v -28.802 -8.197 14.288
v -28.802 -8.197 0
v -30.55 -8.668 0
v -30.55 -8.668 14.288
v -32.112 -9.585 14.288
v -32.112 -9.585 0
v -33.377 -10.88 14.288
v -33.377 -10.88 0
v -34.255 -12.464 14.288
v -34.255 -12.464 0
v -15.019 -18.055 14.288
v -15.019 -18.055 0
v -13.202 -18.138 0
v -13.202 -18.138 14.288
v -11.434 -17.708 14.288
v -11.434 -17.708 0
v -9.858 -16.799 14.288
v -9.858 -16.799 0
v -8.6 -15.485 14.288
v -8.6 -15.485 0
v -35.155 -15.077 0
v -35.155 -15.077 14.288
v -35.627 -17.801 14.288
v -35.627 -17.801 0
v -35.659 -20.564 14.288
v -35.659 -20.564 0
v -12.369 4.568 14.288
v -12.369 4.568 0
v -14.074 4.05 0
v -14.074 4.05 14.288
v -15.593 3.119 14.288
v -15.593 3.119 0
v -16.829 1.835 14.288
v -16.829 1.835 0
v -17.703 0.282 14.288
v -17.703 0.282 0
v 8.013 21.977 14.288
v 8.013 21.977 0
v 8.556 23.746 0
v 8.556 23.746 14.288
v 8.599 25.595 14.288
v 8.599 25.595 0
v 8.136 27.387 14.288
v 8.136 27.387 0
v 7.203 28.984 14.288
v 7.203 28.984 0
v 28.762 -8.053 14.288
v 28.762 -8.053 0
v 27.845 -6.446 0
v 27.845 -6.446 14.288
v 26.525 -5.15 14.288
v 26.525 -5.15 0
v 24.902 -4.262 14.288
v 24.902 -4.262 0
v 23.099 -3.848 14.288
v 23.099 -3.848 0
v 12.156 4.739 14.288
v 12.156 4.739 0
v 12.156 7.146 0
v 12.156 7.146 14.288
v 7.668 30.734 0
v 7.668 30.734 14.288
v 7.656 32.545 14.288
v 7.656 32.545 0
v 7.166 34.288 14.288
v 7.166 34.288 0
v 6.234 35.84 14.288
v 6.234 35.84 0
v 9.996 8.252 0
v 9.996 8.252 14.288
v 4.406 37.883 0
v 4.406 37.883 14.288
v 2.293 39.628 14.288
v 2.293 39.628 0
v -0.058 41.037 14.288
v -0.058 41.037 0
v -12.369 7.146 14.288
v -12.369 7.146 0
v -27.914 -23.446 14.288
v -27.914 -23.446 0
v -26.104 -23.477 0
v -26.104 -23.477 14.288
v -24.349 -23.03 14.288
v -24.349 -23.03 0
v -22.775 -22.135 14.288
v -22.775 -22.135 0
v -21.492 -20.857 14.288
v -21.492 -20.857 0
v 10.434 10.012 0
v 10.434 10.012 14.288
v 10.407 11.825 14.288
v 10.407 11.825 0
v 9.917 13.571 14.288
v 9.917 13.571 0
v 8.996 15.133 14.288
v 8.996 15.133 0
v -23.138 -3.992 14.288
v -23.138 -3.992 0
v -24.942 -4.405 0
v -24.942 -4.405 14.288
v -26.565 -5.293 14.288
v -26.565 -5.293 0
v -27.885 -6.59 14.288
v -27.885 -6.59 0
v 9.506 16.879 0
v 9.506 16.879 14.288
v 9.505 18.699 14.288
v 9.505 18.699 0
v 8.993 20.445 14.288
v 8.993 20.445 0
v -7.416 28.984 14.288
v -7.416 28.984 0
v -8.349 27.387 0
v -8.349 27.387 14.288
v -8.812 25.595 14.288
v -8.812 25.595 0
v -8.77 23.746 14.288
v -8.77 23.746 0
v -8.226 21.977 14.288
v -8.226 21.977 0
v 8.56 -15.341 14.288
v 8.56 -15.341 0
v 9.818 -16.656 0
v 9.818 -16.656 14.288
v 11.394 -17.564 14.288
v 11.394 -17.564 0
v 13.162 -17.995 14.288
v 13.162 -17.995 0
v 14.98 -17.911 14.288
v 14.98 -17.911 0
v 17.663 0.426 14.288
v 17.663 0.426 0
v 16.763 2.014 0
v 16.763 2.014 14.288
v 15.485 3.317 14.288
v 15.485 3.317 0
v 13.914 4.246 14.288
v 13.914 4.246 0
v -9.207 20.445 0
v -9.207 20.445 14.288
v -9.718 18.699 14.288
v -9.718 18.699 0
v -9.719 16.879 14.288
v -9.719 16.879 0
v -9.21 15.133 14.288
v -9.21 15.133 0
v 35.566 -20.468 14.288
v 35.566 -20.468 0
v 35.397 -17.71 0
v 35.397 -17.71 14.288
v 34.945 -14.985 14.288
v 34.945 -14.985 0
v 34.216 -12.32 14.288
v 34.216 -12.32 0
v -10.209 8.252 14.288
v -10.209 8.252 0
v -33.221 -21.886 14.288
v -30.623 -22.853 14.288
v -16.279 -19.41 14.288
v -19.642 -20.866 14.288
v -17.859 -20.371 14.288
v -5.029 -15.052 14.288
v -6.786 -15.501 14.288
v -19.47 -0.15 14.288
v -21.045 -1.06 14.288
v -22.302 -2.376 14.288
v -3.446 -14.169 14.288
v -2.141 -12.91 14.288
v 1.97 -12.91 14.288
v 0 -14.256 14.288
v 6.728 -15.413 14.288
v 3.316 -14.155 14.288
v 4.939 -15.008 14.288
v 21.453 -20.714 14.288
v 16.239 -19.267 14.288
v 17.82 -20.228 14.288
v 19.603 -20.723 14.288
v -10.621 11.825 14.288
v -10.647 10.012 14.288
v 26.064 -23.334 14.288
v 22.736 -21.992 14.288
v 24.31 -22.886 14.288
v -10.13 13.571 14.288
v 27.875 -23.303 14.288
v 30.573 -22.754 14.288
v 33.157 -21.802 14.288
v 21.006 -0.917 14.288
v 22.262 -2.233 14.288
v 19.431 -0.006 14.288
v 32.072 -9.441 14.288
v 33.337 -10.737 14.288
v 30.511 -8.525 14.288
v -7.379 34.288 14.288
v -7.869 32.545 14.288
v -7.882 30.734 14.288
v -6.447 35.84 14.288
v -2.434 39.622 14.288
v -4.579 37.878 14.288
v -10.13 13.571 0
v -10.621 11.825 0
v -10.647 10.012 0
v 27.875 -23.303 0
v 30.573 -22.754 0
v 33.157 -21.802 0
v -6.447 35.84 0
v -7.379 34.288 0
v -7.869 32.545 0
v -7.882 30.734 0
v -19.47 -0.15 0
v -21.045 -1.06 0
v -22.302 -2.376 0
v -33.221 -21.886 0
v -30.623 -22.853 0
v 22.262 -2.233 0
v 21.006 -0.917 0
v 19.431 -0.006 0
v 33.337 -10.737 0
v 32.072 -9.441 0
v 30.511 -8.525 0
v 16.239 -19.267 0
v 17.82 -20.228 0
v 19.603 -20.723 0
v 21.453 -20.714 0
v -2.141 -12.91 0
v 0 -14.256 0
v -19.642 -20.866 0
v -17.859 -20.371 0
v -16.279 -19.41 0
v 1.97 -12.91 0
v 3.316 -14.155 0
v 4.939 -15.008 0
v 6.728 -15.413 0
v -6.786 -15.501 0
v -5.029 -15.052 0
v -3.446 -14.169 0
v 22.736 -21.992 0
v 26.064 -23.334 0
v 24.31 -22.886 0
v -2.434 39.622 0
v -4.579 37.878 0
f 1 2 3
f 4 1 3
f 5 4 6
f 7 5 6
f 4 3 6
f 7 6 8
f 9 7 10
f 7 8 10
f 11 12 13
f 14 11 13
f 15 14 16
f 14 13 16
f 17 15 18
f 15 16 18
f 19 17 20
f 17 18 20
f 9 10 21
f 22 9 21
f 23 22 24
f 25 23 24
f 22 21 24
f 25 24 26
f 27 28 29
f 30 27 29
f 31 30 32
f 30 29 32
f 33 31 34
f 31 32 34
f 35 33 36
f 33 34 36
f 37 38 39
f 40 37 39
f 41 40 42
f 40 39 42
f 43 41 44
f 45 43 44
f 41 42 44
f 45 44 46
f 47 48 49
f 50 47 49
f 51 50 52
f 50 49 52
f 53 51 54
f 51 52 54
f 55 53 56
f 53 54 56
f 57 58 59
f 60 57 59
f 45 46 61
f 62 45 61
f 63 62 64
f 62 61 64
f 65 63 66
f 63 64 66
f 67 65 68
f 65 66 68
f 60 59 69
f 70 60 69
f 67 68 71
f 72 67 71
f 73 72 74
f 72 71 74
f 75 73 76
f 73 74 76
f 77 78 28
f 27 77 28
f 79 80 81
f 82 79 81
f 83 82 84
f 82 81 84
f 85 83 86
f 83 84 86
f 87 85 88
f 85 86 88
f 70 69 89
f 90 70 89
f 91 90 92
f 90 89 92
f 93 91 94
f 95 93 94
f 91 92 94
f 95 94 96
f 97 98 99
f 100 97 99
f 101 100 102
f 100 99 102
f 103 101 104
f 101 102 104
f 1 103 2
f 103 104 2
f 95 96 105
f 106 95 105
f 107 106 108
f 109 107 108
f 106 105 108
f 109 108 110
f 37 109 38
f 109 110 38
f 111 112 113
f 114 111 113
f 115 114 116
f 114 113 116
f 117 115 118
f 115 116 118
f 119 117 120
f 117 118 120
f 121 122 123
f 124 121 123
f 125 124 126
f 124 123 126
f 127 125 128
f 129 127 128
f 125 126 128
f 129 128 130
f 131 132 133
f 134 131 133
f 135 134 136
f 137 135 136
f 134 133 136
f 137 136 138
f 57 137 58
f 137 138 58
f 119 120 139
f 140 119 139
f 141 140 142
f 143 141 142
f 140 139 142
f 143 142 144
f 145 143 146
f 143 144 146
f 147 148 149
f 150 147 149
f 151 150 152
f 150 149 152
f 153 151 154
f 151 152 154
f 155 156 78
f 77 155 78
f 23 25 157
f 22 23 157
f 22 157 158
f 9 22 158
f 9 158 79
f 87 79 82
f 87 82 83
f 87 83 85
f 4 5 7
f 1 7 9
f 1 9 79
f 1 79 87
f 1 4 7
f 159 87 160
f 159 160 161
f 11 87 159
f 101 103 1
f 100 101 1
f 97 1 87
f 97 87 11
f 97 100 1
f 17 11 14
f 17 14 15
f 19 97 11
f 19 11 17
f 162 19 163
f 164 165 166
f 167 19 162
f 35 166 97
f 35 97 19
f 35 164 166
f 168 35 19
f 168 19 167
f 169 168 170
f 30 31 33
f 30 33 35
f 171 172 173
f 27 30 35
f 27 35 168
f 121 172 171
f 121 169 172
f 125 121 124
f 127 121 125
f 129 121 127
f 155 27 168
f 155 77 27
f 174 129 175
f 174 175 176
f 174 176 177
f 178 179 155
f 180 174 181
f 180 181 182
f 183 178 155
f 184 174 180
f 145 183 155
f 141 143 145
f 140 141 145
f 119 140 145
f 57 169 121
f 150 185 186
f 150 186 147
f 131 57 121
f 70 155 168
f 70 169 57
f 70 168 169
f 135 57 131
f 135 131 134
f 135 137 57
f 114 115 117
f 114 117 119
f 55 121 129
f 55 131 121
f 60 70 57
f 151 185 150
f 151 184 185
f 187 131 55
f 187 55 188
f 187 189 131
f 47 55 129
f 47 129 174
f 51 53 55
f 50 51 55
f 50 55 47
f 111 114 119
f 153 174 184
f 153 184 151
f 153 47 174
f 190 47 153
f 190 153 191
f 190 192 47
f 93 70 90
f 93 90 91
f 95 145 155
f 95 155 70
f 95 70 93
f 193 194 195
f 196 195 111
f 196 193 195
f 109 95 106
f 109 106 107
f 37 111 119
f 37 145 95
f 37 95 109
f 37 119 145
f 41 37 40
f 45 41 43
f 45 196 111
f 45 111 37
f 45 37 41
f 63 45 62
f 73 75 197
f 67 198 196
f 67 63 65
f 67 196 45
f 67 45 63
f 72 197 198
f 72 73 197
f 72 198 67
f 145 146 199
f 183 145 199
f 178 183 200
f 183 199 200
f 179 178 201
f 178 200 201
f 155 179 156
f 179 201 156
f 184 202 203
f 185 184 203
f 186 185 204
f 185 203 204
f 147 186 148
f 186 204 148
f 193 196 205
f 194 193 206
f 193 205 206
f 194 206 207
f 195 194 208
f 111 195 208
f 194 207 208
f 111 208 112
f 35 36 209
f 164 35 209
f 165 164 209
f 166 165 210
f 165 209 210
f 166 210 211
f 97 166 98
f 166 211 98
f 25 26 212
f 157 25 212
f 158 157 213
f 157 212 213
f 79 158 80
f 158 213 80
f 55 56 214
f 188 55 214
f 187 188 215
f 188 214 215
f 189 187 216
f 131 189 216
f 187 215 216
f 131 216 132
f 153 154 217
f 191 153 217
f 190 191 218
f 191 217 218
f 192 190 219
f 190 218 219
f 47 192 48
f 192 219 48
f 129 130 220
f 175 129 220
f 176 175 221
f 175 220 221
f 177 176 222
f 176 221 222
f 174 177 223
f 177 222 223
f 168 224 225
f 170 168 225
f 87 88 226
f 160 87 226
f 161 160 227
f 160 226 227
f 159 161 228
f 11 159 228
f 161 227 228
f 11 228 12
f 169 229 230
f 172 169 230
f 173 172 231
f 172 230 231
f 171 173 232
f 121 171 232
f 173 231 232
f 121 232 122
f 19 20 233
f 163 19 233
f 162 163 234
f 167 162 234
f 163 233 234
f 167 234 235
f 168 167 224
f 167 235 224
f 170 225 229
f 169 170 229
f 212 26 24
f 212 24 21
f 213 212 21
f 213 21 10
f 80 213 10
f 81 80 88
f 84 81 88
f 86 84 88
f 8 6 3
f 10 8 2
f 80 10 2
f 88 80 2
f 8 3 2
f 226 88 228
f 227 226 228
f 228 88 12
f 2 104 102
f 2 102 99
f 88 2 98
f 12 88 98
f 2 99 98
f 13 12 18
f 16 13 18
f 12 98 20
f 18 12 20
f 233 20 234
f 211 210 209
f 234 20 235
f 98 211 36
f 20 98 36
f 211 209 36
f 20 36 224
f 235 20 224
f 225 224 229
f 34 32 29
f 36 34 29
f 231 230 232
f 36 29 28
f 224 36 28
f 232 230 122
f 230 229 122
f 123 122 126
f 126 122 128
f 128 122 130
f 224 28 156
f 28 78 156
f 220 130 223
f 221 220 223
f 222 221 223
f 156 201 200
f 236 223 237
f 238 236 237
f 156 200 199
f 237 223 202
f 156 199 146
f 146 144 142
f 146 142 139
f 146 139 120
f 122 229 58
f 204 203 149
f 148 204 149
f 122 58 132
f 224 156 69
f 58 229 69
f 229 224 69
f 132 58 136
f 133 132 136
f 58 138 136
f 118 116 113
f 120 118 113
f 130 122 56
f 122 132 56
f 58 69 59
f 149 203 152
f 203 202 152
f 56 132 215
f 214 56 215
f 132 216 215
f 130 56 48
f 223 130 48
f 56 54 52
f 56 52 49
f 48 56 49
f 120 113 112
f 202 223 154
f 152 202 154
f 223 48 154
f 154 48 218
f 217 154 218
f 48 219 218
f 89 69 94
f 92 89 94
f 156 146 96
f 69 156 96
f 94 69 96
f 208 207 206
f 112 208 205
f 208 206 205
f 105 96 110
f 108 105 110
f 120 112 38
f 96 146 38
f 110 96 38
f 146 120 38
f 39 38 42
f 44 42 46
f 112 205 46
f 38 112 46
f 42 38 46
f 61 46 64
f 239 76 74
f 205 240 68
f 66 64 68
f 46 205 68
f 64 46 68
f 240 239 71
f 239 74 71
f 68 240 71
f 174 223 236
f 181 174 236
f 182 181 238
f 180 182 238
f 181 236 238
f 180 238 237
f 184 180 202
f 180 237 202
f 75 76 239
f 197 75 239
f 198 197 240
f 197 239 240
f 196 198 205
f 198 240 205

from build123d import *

# Parameters (mm, degrees)
F1_DEPTH = 14.2875


# Not quite as in the source:
# - a length typed as a fraction of an inch, garbled in the dataset ("3 / 203.2 mm" for 3/8 in), is restored


with BuildPart() as f1:
    # F0 (on Top) → F1 (new body)
    with BuildSketch(Plane.XY):
        with BuildLine():
            ThreePointArc((-0.0584694644, 41.0366132855), (-3.5379130554, 38.7889545067), (-6.4473585226, 35.840459168))
            ThreePointArc((-6.4473585226, 35.840459168), (-7.8691085687, 32.5448223466), (-7.4162920937, 28.9842672646))
            ThreePointArc((-7.4162920937, 28.9842672646), (-8.8119305122, 25.5953281623), (-8.2258973271, 21.977417171))
            ThreePointArc((-8.2258973271, 21.977417171), (-9.7181261566, 18.698842434), (-9.2097157612, 15.1327075437))
            ThreePointArc((-9.2097157612, 15.1327075437), (-10.6205392688, 11.8246856933), (-10.2093555033, 8.2519613206))
            Line((-10.2093555033, 8.2519613206), (-12.369341217, 7.1464567445))
            Line((-12.369341217, 7.1464567445), (-12.369341217, 4.6386048198))
            Line((-12.369341217, 4.6386048198), (-12.369341217, 4.5682978211))
            ThreePointArc((-12.369341217, 4.5682978211), (-15.5930977879, 3.1185654947), (-17.7027139134, 0.2823972963))
            ThreePointArc((-17.7027139134, 0.2823972963), (-21.0452825194, -1.0603738309), (-23.1384971151, -3.9919692741))
            ThreePointArc((-23.1384971151, -3.9919692741), (-26.5647165348, -5.2934051439), (-28.80180468, -8.19653302))
            ThreePointArc((-28.80180468, -8.19653302), (-32.1117440701, -9.5846599904), (-34.254974256, -12.4637500588))
            ThreePointArc((-34.254974256, -12.4637500588), (-35.4454588739, -16.4293701566), (-35.6585793197, -20.564340055))
            ThreePointArc((-35.6585793197, -20.564340055), (-31.9389059128, -22.4150036937), (-27.9142765499, -23.4461606411))
            ThreePointArc((-27.9142765499, -23.4461606411), (-24.3492963179, -23.0296138883), (-21.4921734029, -20.8571857766))
            ThreePointArc((-21.4921734029, -20.8571857766), (-17.8594468391, -20.3713745504), (-15.0192606046, -18.054899429))
            ThreePointArc((-15.0192606046, -18.054899429), (-11.4338171794, -17.7079201351), (-8.5996589687, -15.484556372))
            ThreePointArc((-8.5996589687, -15.484556372), (-5.0294162563, -15.0523544446), (-2.1409380715, -12.9098966718))
            Line((-2.1409380715, -12.9098966718), (0, -14.2561570176))
            Line((0, -14.2561570176), (1.9696742658, -12.9098966718))
            ThreePointArc((1.9696742658, -12.9098966718), (4.9392756736, -15.0084468105), (8.560301624, -15.3410370587))
            ThreePointArc((8.560301624, -15.3410370587), (11.3944598347, -17.5644008218), (14.9799032599, -17.9113801157))
            ThreePointArc((14.9799032599, -17.9113801157), (17.8200894944, -20.2278552371), (21.4528160582, -20.7136664634))
            ThreePointArc((21.4528160582, -20.7136664634), (24.3099389732, -22.886094575), (27.8749192052, -23.3026413279))
            ThreePointArc((27.8749192052, -23.3026413279), (31.8832272801, -22.3269581873), (35.5659238994, -20.4678624868))
            ThreePointArc((35.5659238994, -20.4678624868), (35.2059818343, -16.3418066269), (34.2156169113, -12.3202307456))
            ThreePointArc((34.2156169113, -12.3202307456), (32.0723867254, -9.4411406771), (28.7624473353, -8.0530137067))
            ThreePointArc((28.7624473353, -8.0530137067), (26.5253591901, -5.1498858306), (23.0991397704, -3.8484499608))
            ThreePointArc((23.0991397704, -3.8484499608), (21.0059251747, -0.9168545176), (17.6633565687, 0.4259166096))
            ThreePointArc((17.6633565687, 0.4259166096), (15.4847616458, 3.3168082822), (12.1560195839, 4.739132713))
            Line((12.1560195839, 4.739132713), (12.1560195839, 7.1464567445))
            Line((12.1560195839, 7.1464567445), (9.9960338703, 8.2519613206))
            ThreePointArc((9.9960338703, 8.2519613206), (10.4072176357, 11.8246856933), (8.9963941282, 15.1327075437))
            ThreePointArc((8.9963941282, 15.1327075437), (9.5048045235, 18.698842434), (8.012575694, 21.977417171))
            ThreePointArc((8.012575694, 21.977417171), (8.5986088792, 25.5953281623), (7.2029704606, 28.9842672646))
            ThreePointArc((7.2029704606, 28.9842672646), (7.6557869357, 32.5448223466), (6.2340368895, 35.840459168))
            ThreePointArc((6.2340368895, 35.840459168), (3.3823120514, 38.7952079886), (-0.0584694644, 41.0366132855))
        make_face()
    extrude(amount=F1_DEPTH)


solid = f1.part
